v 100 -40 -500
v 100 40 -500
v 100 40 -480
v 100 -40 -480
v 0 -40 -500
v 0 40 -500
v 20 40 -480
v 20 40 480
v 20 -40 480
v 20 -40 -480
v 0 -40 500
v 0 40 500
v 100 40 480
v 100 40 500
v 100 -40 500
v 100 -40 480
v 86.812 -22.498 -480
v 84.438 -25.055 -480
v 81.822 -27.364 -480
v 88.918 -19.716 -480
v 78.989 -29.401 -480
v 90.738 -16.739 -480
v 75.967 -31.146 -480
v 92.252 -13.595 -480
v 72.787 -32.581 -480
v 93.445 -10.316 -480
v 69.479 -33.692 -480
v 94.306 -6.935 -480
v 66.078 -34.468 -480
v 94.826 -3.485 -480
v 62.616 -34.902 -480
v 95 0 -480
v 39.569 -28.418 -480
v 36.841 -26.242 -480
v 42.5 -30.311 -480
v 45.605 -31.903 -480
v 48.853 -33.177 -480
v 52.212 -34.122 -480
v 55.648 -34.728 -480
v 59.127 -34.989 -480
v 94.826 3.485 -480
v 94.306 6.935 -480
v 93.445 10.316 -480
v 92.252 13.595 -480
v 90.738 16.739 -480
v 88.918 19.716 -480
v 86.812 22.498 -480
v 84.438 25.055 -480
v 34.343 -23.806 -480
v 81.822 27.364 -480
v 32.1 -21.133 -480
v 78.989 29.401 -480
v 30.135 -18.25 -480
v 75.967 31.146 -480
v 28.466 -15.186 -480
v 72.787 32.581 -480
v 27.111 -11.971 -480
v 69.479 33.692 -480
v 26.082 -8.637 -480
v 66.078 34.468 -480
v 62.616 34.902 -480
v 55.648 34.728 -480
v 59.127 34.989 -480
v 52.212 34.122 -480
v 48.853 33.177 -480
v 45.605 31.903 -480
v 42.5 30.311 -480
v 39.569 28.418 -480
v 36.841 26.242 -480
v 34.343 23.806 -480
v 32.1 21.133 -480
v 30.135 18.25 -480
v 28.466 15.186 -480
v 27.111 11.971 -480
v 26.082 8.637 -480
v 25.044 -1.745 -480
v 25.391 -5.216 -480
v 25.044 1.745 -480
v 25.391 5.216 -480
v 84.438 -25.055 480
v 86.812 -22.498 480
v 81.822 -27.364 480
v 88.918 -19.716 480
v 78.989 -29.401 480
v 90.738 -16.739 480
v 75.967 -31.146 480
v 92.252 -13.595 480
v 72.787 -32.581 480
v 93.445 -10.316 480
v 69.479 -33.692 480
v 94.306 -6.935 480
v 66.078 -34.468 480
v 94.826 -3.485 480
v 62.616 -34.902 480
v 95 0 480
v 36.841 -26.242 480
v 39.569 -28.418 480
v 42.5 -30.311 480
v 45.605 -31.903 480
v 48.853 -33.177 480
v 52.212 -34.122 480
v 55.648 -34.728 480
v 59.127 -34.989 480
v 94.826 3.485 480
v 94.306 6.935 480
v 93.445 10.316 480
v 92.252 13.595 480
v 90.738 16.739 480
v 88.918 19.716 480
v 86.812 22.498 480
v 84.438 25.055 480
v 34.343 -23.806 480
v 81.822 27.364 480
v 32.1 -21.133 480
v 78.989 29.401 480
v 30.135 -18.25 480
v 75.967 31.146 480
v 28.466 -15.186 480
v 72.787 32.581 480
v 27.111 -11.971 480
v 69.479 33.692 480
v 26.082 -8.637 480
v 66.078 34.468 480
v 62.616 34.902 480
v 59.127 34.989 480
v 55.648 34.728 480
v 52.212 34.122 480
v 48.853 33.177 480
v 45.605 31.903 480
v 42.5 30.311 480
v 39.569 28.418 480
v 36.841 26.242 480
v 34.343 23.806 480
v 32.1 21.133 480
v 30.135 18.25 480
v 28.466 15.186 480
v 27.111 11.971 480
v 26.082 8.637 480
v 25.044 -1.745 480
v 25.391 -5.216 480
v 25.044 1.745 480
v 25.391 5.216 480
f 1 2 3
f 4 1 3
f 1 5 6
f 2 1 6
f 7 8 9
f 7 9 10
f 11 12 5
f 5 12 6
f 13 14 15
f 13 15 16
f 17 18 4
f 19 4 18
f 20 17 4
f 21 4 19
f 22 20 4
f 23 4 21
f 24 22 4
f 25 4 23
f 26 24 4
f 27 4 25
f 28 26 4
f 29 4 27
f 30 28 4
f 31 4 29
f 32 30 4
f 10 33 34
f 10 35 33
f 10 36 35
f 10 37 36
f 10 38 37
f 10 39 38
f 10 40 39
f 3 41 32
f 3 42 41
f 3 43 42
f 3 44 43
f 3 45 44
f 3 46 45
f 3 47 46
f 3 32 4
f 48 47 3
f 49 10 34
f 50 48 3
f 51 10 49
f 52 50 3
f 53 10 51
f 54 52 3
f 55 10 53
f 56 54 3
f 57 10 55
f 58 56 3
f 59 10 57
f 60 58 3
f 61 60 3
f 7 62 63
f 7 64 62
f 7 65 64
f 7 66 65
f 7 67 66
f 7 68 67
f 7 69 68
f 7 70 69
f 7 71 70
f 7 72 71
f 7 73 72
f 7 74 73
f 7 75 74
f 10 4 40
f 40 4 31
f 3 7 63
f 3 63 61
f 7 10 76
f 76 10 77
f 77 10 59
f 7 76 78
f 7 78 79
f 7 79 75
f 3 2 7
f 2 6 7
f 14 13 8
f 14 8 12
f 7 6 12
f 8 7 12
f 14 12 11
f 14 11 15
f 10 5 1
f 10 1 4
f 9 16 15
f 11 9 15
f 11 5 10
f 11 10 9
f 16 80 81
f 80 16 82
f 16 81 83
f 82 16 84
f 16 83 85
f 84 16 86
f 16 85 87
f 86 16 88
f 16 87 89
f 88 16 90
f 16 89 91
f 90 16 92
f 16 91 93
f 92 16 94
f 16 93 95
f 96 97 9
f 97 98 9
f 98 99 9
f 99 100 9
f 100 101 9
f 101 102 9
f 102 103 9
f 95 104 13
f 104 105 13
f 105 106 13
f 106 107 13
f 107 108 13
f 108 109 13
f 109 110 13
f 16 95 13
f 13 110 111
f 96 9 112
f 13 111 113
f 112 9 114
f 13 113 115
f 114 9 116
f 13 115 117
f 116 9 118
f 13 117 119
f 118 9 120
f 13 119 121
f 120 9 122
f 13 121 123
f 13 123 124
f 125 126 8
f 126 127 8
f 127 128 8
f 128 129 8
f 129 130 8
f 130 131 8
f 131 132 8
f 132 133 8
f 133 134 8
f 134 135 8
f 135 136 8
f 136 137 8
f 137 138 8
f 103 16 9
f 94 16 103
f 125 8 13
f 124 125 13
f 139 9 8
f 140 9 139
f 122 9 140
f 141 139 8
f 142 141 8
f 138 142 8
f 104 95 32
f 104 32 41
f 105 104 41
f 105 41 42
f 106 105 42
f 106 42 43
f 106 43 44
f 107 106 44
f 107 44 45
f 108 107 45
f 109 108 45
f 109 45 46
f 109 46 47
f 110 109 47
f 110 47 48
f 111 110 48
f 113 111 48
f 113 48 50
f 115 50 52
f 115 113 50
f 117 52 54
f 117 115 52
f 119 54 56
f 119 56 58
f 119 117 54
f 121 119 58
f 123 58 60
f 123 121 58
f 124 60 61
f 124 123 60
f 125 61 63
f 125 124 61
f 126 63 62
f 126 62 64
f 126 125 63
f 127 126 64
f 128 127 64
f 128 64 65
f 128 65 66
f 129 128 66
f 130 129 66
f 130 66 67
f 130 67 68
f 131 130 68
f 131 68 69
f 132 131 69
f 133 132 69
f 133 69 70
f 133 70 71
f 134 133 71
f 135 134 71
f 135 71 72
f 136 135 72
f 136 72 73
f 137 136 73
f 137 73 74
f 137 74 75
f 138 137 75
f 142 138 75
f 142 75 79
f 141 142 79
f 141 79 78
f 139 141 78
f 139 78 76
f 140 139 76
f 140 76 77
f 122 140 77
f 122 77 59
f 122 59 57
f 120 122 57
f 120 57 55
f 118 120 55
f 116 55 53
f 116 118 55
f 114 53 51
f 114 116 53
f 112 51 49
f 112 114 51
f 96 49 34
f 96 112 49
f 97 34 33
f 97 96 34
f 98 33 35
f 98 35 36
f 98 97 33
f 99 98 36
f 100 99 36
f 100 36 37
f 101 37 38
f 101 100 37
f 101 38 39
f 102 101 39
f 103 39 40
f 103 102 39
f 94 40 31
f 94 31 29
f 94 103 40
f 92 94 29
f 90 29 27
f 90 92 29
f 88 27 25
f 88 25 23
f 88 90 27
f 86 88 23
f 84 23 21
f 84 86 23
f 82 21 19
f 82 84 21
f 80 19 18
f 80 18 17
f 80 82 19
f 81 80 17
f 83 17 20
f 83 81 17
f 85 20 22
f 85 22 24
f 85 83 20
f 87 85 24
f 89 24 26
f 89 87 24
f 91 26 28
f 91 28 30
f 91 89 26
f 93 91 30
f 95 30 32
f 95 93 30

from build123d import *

# Parameters (mm, degrees)
SKETCH_1_W        = 1000
SKETCH_1_H        = 80
EXTRUDE_1_DEPTH   = 20
SKETCH_2_W        = 20
SKETCH_2_H        = 80
EXTRUDE_1_2_DEPTH = 80
SKETCH_3_R        = 35
EXTRUDE_2_DEPTH   = 980


with BuildPart() as part:
    # 草图1 → Extrude 1 (new body)
    with BuildSketch(Plane(origin=(0, 0, 0), x_dir=(0, 0, -1), z_dir=(1, 0, 0))):
        Rectangle(SKETCH_1_W, SKETCH_1_H)
    extrude(amount=EXTRUDE_1_DEPTH)

    # 草图2 → Extrude 1 2 (add)
    with BuildSketch(Plane(origin=(20, 0, 0), x_dir=(0, 0, -1), z_dir=(1, 0, 0))):
        with Locations((-490, 0)):
            Rectangle(SKETCH_2_W, SKETCH_2_H)
    extrude_1_2 = extrude(amount=EXTRUDE_1_2_DEPTH)

    # 镜向1: Extrude 1 2 across plane
    add(extrude_1_2.mirror(Plane.XY))

    # 草图3 → 凸台-拉伸2 (add)
    with BuildSketch(Plane.XY.offset(500)):
        with Locations((60, 0)):
            Circle(SKETCH_3_R)
    extrude(amount=-EXTRUDE_2_DEPTH)


solid = part.part
